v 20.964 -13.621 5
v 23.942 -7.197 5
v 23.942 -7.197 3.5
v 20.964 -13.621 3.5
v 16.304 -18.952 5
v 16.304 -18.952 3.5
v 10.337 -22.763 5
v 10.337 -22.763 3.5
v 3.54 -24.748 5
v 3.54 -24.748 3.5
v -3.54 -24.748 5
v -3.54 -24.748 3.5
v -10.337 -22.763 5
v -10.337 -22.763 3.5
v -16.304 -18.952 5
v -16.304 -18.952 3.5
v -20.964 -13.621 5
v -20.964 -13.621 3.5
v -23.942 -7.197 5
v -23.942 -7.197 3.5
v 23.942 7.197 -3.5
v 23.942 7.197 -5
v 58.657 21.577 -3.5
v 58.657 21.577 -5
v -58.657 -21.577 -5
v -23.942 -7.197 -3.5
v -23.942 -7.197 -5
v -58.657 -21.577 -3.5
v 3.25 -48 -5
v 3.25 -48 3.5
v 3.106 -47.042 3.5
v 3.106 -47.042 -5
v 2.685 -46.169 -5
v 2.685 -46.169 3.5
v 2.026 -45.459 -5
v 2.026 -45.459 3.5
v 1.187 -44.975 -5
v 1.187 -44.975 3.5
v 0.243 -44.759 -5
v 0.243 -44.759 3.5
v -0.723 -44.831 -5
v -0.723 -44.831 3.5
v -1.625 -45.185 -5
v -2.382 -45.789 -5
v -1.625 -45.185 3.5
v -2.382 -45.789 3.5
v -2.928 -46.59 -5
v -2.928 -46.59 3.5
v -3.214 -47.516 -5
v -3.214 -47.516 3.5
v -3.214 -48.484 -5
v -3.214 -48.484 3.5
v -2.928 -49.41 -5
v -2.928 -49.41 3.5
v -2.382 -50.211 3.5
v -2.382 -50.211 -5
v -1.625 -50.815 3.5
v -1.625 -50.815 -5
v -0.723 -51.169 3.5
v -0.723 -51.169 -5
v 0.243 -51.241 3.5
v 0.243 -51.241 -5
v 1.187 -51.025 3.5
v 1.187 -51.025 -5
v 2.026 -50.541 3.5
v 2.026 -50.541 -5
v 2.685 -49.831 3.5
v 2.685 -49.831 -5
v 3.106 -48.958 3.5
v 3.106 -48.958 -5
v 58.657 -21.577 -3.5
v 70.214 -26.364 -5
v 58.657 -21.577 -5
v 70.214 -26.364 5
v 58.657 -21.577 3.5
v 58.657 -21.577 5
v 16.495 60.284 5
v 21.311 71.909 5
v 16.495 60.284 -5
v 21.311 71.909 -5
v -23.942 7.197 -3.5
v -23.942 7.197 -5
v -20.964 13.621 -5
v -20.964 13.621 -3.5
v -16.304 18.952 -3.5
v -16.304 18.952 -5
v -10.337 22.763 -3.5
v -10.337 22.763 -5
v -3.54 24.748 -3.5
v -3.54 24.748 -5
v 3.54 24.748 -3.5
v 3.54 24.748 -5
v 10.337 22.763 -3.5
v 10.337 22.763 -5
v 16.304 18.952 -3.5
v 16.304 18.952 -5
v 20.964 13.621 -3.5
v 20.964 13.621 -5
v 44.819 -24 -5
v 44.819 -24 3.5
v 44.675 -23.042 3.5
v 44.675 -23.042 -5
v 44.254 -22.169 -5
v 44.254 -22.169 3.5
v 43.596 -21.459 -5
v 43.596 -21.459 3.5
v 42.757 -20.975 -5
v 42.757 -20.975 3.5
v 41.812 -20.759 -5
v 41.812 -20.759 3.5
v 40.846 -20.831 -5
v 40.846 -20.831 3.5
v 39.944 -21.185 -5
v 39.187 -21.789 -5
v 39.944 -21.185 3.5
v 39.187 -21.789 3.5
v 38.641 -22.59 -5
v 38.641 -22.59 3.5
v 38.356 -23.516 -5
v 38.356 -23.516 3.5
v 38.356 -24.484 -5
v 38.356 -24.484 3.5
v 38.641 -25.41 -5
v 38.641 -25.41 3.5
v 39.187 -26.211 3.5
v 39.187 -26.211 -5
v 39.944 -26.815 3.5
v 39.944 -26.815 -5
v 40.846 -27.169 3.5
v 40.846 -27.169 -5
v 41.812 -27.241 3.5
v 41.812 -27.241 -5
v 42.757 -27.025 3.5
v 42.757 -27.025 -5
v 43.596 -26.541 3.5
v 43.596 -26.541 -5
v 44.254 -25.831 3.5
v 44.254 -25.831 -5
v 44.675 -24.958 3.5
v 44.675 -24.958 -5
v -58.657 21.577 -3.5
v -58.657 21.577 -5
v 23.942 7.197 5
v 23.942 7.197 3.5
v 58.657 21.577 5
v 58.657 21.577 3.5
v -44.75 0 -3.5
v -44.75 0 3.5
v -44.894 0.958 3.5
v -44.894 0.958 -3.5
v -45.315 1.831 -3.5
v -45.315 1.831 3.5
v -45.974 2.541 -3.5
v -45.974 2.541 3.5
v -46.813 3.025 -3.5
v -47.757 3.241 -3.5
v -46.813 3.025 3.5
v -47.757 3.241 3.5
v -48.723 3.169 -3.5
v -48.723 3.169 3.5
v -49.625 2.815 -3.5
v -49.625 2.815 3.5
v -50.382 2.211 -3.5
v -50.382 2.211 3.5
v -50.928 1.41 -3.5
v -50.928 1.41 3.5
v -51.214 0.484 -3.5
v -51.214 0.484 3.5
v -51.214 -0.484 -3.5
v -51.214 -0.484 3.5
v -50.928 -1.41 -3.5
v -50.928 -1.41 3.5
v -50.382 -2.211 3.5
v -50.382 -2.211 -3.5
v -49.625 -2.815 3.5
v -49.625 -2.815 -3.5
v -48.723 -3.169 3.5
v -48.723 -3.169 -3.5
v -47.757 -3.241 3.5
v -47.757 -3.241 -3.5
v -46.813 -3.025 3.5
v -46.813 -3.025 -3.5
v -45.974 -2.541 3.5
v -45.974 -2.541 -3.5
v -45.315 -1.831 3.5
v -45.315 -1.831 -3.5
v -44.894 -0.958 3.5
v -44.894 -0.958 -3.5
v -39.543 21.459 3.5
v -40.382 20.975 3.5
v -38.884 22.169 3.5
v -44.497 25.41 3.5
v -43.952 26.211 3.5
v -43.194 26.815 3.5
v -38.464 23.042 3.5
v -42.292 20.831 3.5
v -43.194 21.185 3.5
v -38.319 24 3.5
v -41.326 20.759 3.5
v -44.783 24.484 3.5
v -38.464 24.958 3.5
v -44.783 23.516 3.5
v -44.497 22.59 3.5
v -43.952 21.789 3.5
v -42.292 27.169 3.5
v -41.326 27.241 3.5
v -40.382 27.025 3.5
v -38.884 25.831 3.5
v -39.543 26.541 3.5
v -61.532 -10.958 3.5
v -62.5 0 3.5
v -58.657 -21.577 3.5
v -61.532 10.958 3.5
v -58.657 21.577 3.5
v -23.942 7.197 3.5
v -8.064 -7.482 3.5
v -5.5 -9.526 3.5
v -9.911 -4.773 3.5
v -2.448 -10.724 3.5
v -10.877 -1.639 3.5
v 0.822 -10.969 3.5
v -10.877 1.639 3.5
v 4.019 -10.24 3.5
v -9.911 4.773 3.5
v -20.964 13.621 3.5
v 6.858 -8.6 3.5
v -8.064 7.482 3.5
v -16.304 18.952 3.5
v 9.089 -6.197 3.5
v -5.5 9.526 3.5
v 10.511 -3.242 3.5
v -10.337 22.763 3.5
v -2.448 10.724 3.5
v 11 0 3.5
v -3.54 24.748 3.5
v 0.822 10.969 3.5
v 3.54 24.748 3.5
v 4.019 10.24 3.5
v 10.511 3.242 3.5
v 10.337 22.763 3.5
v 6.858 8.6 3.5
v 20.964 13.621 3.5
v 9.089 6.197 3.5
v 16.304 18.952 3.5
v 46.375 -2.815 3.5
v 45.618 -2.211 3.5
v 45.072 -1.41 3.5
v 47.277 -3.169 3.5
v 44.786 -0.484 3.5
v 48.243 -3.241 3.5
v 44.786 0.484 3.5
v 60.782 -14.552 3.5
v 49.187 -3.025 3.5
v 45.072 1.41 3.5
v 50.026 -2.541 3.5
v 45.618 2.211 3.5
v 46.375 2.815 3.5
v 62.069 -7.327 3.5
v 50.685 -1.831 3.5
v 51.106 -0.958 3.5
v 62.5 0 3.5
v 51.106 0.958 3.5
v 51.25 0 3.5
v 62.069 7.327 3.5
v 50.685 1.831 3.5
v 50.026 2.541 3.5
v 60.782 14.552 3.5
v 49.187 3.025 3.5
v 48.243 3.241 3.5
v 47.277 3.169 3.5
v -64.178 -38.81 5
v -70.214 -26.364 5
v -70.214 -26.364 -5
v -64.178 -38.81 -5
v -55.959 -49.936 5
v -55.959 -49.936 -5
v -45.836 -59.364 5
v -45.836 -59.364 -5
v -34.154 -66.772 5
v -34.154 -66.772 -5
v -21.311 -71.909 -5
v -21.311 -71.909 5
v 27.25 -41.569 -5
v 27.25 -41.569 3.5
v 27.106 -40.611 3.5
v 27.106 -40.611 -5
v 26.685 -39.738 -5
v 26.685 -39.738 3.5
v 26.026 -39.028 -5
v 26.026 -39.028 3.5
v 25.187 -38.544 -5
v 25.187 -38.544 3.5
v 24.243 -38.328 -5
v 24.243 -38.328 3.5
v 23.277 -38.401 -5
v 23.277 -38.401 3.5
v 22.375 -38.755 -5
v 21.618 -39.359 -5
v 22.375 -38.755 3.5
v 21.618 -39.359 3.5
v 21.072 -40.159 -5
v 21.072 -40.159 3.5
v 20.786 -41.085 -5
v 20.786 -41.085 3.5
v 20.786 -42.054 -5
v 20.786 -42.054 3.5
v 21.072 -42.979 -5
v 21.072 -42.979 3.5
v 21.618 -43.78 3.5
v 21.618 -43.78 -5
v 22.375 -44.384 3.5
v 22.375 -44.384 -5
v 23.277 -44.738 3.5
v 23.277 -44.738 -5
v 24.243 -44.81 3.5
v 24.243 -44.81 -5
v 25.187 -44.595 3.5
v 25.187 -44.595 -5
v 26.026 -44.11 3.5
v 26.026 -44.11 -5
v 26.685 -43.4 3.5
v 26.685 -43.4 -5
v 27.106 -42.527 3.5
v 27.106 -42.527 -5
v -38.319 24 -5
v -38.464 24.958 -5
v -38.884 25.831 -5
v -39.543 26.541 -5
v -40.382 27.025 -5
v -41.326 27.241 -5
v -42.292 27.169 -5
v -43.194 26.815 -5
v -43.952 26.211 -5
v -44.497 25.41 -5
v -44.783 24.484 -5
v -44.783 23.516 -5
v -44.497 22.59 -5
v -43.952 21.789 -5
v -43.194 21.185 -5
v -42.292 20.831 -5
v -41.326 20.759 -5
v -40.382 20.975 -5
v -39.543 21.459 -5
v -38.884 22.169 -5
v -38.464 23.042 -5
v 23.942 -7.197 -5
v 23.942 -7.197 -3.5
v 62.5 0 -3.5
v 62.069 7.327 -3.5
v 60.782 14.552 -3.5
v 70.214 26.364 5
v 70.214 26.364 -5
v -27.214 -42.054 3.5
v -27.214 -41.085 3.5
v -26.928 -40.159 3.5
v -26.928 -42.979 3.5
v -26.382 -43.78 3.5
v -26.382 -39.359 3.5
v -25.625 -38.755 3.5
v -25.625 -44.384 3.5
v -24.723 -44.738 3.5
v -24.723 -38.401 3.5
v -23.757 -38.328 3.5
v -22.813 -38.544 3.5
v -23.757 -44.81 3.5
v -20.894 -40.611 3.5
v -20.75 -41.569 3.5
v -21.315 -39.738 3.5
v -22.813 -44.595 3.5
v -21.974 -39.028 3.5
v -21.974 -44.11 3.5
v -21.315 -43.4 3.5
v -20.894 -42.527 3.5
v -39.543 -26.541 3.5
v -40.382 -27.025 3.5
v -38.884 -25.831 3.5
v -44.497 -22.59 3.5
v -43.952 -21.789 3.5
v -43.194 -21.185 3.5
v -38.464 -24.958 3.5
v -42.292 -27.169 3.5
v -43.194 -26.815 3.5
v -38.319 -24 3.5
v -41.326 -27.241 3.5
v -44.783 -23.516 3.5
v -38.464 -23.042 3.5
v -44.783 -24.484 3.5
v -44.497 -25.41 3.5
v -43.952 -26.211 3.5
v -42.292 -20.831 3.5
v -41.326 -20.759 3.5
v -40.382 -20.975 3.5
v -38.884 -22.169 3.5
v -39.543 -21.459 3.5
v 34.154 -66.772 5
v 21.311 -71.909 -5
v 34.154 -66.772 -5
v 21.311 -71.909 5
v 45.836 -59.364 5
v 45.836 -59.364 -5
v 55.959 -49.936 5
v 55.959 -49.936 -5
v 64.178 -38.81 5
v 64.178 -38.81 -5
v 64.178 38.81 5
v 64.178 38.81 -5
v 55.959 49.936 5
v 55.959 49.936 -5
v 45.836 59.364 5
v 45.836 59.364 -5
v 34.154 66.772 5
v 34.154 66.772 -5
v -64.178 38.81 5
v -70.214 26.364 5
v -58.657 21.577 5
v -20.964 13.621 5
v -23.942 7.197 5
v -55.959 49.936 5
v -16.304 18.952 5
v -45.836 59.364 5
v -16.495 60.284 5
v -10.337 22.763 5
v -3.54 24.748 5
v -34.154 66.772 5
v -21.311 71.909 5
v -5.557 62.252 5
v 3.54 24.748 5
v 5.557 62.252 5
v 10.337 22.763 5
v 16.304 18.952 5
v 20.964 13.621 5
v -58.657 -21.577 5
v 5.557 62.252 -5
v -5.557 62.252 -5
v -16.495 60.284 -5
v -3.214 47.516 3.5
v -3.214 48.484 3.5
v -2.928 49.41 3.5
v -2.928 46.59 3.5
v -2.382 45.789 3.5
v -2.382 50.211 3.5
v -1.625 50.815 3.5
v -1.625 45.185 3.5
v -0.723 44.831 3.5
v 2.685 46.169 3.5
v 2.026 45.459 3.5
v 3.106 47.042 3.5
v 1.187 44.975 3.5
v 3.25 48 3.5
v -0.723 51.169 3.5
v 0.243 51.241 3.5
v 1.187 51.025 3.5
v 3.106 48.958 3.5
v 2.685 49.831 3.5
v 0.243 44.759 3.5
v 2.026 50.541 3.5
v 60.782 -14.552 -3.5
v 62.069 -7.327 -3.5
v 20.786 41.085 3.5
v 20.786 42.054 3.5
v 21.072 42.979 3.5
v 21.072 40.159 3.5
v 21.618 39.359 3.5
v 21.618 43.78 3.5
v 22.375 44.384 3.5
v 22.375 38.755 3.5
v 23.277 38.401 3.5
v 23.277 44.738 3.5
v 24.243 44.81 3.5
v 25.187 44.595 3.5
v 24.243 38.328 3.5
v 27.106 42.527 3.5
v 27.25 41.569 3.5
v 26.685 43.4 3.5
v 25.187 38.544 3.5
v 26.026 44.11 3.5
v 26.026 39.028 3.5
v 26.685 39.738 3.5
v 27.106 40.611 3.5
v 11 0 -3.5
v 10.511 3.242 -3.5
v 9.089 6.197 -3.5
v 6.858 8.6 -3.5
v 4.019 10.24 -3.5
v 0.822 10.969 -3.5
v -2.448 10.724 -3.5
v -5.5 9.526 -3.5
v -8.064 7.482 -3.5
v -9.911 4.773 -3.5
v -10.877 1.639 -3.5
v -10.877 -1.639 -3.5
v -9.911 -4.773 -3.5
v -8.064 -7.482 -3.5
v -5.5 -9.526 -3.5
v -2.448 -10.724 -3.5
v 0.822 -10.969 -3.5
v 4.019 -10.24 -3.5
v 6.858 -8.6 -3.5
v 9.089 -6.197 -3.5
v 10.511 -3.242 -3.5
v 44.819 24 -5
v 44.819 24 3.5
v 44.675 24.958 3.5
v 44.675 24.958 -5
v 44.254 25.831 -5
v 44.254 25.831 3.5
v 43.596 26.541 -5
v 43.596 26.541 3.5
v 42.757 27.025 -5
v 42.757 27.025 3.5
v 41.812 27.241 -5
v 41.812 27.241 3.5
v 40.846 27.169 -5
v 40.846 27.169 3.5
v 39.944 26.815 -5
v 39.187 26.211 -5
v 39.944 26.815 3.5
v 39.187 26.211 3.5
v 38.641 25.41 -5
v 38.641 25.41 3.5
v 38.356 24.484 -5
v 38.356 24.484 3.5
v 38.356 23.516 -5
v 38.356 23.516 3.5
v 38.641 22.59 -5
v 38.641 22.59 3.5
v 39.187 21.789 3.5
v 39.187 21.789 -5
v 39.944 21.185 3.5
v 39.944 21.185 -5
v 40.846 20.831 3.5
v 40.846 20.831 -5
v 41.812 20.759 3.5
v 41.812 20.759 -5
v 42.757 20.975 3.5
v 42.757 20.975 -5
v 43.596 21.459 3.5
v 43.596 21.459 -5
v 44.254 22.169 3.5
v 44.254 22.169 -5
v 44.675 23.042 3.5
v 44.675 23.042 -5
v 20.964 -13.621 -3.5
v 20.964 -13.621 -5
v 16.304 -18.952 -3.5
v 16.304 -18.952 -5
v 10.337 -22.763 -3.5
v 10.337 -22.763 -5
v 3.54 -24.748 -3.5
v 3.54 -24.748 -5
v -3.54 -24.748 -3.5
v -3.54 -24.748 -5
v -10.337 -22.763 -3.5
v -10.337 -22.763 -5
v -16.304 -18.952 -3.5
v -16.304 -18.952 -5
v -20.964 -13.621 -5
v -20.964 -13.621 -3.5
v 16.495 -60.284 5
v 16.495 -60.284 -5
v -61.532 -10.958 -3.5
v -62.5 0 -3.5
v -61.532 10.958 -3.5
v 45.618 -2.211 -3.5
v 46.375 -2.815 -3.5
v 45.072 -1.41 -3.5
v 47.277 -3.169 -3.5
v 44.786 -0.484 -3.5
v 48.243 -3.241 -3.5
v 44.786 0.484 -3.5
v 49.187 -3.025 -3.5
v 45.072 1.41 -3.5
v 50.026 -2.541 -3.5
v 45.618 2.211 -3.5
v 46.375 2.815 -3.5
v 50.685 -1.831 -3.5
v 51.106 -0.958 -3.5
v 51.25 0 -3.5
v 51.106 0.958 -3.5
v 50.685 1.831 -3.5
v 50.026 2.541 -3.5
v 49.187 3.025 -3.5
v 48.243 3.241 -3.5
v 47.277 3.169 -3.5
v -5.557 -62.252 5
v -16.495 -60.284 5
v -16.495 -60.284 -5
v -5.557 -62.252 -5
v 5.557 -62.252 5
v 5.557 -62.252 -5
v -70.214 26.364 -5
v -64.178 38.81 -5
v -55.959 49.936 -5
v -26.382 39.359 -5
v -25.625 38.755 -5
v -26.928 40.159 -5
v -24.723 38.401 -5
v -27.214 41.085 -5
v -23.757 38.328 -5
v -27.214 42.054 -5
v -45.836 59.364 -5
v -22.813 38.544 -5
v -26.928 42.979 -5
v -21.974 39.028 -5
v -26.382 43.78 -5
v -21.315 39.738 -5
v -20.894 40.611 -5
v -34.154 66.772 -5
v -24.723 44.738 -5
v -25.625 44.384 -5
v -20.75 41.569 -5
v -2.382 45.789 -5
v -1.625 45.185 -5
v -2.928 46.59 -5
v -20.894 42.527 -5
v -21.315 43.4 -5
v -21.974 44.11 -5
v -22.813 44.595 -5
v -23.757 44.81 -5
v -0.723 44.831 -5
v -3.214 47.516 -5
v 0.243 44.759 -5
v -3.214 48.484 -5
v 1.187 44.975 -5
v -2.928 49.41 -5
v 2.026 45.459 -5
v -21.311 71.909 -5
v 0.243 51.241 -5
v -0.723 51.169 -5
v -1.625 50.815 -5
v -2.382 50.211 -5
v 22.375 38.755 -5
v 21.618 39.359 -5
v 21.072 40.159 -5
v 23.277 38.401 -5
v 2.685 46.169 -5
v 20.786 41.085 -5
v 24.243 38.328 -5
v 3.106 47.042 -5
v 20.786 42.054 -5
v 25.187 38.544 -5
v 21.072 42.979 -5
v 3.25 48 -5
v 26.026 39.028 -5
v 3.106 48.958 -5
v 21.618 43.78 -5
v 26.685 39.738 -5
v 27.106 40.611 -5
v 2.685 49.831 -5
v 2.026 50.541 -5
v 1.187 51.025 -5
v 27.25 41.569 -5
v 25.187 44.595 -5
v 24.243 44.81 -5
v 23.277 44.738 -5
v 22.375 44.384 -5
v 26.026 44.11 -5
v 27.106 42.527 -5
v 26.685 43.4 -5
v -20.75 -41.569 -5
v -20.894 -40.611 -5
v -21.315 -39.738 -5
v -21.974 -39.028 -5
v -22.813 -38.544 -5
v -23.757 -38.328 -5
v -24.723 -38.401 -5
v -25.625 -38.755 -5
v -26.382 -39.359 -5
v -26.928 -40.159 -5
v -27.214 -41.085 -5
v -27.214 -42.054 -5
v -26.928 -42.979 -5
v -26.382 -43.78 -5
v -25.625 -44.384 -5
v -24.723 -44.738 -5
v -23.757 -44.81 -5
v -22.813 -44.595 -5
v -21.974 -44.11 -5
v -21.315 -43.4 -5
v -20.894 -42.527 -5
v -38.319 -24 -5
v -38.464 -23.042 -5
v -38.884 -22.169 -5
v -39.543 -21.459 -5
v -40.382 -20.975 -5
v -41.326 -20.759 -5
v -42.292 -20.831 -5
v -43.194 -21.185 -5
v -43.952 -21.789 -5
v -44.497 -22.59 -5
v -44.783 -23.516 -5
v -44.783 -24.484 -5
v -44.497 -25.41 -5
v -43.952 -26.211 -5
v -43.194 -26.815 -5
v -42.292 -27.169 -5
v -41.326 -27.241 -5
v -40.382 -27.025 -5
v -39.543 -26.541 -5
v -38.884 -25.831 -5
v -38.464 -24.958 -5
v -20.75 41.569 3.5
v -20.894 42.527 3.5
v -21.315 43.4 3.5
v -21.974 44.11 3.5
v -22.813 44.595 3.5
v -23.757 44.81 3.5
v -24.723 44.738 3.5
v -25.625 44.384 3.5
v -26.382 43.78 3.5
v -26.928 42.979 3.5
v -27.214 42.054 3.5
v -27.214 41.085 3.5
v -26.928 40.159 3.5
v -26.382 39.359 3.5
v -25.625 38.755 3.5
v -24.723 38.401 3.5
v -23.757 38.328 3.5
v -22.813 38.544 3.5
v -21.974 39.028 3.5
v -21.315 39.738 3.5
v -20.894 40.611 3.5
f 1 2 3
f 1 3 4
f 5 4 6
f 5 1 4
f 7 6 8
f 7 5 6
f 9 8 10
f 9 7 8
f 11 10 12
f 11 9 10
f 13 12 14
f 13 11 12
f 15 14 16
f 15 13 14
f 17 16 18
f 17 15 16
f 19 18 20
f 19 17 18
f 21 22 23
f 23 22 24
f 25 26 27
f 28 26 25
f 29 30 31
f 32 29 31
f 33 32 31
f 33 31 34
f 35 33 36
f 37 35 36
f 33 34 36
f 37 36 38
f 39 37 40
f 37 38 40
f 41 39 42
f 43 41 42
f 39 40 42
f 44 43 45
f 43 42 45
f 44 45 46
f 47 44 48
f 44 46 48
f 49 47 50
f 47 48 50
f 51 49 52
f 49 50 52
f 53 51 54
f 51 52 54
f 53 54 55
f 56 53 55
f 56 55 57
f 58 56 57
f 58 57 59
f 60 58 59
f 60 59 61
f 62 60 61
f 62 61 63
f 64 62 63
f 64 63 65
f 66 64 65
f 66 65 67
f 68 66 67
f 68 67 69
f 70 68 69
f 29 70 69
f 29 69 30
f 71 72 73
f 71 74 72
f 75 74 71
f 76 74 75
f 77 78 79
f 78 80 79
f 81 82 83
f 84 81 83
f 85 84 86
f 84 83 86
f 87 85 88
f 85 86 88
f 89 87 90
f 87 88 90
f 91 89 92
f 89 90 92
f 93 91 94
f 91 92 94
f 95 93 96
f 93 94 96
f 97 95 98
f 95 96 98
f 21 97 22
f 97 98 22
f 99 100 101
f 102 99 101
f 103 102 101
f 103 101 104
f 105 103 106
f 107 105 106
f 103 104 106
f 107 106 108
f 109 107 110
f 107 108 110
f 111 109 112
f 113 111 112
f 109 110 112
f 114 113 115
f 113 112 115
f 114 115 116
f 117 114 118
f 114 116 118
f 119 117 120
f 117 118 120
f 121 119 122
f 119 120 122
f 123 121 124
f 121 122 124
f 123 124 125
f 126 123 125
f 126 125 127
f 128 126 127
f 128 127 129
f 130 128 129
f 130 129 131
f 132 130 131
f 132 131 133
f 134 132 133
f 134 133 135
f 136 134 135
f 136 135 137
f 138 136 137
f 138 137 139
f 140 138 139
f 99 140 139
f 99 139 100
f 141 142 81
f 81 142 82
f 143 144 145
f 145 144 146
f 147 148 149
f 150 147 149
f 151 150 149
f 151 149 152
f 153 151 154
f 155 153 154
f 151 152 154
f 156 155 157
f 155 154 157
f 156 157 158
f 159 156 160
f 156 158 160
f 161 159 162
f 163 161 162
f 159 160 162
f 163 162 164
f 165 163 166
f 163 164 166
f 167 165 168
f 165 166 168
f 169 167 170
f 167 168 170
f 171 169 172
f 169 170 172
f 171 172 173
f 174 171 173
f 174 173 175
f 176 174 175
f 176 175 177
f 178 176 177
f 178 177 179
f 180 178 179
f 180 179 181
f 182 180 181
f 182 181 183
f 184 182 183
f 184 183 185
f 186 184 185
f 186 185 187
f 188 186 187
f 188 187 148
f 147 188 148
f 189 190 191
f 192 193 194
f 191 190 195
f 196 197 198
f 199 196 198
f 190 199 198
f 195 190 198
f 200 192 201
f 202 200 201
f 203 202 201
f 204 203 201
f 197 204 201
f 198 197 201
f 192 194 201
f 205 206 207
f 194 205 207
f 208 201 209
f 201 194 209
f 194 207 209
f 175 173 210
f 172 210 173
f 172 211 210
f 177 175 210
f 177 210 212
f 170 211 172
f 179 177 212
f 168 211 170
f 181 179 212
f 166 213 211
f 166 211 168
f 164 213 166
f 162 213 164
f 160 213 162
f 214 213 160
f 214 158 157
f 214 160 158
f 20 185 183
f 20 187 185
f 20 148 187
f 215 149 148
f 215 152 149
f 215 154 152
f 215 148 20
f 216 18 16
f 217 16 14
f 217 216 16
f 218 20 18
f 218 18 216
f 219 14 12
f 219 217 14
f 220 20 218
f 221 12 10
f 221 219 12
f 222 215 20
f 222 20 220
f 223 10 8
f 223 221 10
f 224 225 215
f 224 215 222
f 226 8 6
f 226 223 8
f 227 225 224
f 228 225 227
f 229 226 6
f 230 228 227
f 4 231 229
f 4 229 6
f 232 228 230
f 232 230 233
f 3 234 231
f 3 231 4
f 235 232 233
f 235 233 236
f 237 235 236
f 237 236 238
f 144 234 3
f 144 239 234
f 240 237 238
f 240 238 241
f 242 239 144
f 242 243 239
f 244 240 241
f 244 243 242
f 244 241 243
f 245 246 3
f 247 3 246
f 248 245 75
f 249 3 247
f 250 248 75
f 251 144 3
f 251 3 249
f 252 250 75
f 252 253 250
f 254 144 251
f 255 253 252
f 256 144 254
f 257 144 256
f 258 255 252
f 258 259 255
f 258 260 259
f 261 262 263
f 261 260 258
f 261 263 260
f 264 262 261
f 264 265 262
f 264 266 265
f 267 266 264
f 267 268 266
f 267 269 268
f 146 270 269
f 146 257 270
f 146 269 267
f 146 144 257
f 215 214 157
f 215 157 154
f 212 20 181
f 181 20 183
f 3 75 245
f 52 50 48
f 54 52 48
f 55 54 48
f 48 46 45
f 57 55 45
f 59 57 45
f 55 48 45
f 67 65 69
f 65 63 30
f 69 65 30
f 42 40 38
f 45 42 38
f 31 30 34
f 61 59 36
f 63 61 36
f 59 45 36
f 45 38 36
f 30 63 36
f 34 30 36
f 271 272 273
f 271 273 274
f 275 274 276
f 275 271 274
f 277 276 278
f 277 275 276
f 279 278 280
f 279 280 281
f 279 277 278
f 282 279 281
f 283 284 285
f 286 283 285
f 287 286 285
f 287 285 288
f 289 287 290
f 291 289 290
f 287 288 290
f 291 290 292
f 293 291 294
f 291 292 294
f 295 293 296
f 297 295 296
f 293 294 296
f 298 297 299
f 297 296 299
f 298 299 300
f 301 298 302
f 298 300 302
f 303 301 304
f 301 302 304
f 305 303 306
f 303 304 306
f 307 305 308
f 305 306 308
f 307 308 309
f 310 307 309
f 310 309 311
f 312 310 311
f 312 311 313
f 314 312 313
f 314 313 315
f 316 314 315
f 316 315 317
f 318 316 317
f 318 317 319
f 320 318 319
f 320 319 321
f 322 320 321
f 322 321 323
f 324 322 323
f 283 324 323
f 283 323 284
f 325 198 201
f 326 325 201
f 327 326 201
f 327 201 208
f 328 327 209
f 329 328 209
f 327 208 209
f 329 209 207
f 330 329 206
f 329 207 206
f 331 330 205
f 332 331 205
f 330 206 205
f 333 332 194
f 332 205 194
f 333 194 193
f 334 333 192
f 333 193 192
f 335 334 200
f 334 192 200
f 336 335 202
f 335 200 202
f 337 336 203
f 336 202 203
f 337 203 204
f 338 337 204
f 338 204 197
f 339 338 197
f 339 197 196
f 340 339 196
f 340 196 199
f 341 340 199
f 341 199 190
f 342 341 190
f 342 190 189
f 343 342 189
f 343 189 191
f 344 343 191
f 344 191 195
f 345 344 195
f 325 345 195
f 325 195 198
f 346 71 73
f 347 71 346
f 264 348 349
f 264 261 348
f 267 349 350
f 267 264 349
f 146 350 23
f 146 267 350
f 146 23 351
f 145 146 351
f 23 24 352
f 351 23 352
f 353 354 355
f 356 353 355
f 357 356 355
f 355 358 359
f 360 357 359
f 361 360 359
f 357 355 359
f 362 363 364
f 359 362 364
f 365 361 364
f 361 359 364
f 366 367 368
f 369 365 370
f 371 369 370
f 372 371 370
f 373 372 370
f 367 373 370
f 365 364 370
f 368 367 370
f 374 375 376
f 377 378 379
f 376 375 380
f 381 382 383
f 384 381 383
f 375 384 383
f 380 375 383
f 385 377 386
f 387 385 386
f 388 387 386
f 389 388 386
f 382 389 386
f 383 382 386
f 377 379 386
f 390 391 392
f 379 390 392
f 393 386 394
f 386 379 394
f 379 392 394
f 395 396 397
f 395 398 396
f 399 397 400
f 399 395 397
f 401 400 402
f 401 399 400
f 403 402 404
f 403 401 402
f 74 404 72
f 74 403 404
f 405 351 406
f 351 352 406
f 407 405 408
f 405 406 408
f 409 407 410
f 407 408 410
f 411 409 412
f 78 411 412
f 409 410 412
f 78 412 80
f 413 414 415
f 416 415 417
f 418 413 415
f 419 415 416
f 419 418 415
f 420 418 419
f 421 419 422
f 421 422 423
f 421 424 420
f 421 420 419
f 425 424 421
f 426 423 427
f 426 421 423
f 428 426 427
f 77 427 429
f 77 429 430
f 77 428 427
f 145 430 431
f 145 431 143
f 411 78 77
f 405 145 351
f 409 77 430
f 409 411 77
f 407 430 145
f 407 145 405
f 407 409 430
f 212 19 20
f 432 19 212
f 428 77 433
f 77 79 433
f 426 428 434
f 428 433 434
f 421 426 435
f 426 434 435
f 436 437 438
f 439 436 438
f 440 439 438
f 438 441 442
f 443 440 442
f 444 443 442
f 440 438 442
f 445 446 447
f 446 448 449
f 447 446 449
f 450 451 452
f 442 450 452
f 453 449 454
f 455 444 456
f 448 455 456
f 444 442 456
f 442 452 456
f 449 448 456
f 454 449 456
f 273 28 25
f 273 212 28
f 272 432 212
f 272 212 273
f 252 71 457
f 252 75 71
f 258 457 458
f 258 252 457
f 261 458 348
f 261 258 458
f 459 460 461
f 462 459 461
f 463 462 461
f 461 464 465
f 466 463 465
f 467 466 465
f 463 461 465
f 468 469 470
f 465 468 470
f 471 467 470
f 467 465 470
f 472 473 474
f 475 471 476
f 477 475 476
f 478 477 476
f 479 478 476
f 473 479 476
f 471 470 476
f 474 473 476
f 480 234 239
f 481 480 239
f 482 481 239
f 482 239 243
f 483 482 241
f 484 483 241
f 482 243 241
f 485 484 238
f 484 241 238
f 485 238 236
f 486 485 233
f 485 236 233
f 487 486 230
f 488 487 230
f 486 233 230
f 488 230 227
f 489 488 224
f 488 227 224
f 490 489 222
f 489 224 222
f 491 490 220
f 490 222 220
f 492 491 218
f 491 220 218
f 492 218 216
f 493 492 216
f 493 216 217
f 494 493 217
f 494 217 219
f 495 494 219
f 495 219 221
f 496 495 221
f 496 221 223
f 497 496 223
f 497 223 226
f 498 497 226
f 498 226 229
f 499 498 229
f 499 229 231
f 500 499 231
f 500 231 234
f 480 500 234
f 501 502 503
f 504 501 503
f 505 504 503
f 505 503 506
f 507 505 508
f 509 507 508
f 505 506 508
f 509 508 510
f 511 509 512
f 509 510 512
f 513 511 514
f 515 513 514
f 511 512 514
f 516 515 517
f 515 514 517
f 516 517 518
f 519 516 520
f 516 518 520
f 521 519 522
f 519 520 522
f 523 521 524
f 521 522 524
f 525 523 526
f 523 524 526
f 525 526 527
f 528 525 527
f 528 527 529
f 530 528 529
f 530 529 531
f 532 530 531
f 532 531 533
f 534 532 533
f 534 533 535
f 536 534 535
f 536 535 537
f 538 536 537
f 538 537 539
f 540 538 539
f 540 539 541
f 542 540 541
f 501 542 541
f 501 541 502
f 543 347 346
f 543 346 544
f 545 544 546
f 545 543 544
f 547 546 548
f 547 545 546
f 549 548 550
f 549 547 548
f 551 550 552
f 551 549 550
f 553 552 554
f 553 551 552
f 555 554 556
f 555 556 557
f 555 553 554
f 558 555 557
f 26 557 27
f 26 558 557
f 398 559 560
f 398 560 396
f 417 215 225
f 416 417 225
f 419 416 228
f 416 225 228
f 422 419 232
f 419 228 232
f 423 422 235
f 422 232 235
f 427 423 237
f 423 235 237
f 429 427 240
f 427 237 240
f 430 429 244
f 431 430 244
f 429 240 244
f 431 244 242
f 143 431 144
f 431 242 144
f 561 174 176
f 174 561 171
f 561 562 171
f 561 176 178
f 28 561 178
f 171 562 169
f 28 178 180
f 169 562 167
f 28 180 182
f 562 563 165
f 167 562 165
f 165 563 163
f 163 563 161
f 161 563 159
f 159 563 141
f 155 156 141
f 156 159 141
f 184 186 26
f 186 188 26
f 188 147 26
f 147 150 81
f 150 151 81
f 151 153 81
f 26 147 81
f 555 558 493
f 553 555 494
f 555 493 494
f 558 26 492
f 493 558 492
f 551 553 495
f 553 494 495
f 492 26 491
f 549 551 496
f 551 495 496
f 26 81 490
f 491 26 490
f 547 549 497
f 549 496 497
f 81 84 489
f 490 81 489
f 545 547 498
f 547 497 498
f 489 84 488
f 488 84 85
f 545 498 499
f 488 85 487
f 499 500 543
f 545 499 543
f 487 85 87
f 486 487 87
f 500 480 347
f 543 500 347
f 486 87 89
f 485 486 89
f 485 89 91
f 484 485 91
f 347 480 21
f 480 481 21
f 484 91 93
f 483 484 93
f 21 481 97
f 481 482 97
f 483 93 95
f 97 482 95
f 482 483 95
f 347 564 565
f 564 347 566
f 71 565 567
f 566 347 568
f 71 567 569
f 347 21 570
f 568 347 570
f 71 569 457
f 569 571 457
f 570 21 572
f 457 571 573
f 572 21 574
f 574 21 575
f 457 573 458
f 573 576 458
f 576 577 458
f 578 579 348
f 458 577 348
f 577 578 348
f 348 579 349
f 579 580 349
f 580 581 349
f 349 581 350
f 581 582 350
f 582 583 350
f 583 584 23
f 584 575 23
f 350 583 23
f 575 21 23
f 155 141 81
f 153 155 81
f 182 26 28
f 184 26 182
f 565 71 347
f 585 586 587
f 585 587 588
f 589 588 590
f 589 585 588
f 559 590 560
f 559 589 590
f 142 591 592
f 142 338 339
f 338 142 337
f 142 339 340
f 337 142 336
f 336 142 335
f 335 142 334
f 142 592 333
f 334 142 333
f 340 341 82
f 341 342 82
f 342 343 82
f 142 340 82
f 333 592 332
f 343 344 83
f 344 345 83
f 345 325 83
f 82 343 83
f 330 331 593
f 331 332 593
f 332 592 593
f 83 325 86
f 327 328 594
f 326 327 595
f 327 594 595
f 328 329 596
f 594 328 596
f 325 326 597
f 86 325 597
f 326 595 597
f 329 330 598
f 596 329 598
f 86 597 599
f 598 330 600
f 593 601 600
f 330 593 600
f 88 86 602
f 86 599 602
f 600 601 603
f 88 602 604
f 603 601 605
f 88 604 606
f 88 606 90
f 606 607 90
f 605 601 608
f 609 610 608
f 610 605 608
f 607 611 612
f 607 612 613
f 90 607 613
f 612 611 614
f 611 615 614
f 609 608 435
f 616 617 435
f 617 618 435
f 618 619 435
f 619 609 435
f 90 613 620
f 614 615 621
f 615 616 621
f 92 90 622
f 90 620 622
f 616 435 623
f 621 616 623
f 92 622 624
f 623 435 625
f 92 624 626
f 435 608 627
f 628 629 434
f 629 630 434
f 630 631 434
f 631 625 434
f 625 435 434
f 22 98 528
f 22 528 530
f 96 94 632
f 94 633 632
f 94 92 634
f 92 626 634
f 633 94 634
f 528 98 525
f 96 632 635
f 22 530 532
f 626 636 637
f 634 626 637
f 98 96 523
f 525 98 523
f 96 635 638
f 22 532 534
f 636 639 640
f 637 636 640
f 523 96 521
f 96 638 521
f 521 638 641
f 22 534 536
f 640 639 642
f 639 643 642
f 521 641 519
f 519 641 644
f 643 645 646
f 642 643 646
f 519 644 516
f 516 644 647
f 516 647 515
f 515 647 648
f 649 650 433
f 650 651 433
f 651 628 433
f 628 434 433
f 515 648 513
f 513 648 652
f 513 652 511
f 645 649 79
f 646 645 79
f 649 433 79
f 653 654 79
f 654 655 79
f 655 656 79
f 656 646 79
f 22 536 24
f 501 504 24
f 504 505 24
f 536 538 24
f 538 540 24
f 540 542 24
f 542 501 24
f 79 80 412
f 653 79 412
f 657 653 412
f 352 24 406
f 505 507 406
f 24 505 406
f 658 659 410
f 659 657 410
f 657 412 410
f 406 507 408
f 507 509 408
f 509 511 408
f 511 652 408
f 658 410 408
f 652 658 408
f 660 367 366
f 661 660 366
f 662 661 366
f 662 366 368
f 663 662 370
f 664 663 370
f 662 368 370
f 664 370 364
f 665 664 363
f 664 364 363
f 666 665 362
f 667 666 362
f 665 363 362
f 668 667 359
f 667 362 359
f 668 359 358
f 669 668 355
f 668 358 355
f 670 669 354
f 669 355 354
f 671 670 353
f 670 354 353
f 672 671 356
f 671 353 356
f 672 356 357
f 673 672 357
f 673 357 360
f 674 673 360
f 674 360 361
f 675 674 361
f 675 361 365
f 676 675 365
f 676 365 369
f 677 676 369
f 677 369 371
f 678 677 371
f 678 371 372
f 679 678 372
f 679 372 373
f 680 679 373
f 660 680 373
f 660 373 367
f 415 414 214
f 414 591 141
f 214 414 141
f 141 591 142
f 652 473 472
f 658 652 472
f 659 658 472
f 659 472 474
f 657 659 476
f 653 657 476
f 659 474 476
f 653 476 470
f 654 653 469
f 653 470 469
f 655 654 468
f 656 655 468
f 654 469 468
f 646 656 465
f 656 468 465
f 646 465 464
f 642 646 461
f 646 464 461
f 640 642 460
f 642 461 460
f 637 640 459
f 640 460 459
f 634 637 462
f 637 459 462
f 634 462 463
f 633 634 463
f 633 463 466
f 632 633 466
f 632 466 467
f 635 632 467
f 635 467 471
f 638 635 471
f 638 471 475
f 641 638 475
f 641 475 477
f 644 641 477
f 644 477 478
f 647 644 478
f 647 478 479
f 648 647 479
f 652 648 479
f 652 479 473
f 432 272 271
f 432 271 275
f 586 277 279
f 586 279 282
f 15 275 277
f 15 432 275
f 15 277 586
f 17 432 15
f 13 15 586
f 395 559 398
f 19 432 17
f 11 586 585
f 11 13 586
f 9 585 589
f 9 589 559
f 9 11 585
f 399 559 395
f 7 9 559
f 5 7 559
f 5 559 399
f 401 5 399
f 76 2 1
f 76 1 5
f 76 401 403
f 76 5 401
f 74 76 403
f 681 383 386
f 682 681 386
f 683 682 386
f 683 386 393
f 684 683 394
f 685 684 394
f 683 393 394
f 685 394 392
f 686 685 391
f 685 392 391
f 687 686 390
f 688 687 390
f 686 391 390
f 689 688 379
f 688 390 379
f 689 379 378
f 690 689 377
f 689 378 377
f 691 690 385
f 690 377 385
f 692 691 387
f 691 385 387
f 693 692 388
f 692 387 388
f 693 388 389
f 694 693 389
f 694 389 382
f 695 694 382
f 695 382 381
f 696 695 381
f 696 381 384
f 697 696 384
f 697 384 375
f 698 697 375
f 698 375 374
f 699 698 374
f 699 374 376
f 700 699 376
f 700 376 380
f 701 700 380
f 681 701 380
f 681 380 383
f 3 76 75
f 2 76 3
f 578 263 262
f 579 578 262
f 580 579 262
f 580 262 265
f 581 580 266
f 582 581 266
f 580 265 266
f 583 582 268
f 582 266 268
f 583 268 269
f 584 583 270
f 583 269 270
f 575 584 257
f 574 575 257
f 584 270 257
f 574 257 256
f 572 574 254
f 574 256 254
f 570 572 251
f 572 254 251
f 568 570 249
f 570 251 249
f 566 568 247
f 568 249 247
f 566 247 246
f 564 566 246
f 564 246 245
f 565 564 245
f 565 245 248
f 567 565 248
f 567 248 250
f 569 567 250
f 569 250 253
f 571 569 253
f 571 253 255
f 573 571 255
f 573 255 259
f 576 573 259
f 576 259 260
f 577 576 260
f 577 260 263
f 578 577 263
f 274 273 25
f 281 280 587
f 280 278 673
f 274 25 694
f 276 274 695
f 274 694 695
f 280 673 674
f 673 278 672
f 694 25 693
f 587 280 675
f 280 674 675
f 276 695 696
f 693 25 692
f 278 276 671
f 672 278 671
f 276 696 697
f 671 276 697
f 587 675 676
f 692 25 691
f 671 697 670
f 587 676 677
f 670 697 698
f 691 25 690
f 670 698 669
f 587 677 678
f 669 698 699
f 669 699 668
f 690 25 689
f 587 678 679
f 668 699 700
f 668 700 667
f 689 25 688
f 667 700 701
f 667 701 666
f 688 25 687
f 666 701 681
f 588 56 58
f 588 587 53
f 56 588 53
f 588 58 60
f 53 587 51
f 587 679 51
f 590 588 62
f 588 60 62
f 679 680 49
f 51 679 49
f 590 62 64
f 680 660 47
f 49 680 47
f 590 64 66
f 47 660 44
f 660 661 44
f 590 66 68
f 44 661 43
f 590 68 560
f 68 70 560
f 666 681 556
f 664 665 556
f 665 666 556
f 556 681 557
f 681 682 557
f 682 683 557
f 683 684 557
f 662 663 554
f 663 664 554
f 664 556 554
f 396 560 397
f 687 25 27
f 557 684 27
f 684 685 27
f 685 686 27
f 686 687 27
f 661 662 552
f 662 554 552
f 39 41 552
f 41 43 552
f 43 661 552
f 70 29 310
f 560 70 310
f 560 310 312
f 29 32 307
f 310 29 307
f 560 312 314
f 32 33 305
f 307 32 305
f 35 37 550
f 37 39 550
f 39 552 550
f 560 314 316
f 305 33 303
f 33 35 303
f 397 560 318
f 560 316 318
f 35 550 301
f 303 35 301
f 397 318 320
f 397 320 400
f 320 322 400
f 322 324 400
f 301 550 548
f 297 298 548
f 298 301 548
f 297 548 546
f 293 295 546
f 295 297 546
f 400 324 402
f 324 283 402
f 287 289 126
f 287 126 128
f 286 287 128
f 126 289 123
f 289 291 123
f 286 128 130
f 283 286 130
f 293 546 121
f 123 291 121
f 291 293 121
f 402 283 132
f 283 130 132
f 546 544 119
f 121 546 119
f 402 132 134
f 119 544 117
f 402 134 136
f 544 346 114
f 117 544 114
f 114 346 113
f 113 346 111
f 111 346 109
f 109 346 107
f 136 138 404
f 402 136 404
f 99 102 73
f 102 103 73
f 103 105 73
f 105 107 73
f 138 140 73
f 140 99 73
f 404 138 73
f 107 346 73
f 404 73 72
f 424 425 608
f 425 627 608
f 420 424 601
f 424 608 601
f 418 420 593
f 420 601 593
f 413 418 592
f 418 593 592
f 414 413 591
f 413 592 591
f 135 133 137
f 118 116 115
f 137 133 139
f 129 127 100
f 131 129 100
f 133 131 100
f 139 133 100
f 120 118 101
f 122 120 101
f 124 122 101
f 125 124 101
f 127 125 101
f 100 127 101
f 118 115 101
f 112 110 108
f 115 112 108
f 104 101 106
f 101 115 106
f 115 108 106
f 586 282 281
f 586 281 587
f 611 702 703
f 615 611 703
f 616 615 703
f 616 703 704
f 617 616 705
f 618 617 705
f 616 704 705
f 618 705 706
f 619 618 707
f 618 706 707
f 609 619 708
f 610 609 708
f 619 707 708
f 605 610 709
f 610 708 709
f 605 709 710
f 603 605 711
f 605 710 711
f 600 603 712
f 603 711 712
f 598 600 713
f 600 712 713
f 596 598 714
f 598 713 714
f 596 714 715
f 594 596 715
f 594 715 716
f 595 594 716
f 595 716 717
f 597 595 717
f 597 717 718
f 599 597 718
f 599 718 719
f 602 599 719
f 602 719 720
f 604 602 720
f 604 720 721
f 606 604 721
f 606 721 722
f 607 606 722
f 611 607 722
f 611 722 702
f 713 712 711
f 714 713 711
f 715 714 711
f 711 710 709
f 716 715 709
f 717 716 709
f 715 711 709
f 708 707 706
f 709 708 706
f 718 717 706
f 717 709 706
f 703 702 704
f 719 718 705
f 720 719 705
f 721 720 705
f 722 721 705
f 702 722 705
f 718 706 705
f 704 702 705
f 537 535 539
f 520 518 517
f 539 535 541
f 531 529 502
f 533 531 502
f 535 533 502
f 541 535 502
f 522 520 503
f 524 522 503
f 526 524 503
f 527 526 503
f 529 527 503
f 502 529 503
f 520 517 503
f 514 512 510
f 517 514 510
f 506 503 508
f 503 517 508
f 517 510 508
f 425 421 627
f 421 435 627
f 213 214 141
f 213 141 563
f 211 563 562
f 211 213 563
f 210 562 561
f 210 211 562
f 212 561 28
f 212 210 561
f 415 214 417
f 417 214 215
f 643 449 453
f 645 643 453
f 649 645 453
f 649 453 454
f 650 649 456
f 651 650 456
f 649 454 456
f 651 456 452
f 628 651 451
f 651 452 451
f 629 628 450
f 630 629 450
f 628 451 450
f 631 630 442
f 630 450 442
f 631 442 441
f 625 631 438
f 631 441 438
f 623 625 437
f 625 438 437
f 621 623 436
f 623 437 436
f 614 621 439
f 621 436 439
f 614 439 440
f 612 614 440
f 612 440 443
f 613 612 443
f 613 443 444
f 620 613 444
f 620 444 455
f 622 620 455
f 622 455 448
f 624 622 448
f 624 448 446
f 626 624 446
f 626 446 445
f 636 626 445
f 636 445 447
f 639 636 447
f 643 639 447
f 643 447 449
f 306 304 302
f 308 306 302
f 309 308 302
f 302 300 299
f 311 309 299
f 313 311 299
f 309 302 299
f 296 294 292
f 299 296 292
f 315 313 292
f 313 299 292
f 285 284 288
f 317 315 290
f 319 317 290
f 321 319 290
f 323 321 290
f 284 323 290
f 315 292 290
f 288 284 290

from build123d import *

# Parameters (mm, degrees)
BOSS_EXTRUDE4_DEPTH   = 5
BOSS_EXTRUDE4_2_DEPTH = 5
BOSS_EXTRUDE5_DEPTH   = 3.5
SKETCH2_R             = 11
CUT_EXTRUDE3_DEPTH    = 10
SKETCH2_4_R           = 11
SKETCH2_4_R_2         = 3.25
CUT_EXTRUDE4_DEPTH    = 25


with BuildPart() as part:
    # Sketch1 → Boss-Extrude4 (new, symmetric)
    with BuildSketch(Plane.XY):
        with BuildLine():
            ThreePointArc((-23.941610741, 7.197171327), (0, 25), (23.941610741, 7.197171327))
            Line((23.941610741, 7.197171327), (70.213649137, 26.363677189))
            ThreePointArc((70.213649137, 26.363677189), (51.115143098, 54.883896965), (21.3105738, 71.908688239))
            Line((21.3105738, 71.908688239), (16.495435726, 60.283916597))
            ThreePointArc((16.495435726, 60.283916597), (0, 62.5), (-16.495435726, 60.283916597))
            Line((-16.495435726, 60.283916597), (-21.3105738, 71.908688239))
            ThreePointArc((-21.3105738, 71.908688239), (-51.115143098, 54.883896965), (-70.213649137, 26.363677189))
            Line((-70.213649137, 26.363677189), (-23.941610741, 7.197171327))
        make_face()
    extrude(amount=BOSS_EXTRUDE4_DEPTH, both=True)



with BuildPart() as body_2:
    # Sketch1 → Boss-Extrude4 2 (new, symmetric)
    with BuildSketch(Plane.XY):
        with BuildLine():
            ThreePointArc((-16.495435726, -60.283916597), (0, -62.5), (16.495435726, -60.283916597))
            Line((16.495435726, -60.283916597), (21.3105738, -71.908688239))
            ThreePointArc((21.3105738, -71.908688239), (51.115143098, -54.883896965), (70.213649137, -26.363677189))
            Line((70.213649137, -26.363677189), (23.941610741, -7.197171327))
            ThreePointArc((23.941610741, -7.197171327), (0, -25), (-23.941610741, -7.197171327))
            Line((-23.941610741, -7.197171327), (-70.213649137, -26.363677189))
            ThreePointArc((-70.213649137, -26.363677189), (-51.115143098, -54.883896965), (-21.3105738, -71.908688239))
            Line((-21.3105738, -71.908688239), (-16.495435726, -60.283916597))
        make_face()
    extrude(amount=BOSS_EXTRUDE4_2_DEPTH, both=True)


with BuildPart() as part_1:
    add(part.part)

    add(body_2.part)  # Boss-Extrude5 merges body 2
    # Sketch1<3> → Boss-Extrude5 (add, symmetric)
    with BuildSketch(Plane.XY):
        with BuildLine():
            Line((58.657369372, 21.57690938), (23.941610741, 7.197171327))
            ThreePointArc((23.941610741, 7.197171327), (0, 25), (-23.941610741, 7.197171327))
            Line((-23.941610741, 7.197171327), (-58.657369372, 21.57690938))
            ThreePointArc((-58.657369372, 21.57690938), (-62.5, 0), (-58.657369372, -21.57690938))
            Line((-58.657369372, -21.57690938), (-23.941610741, -7.197171327))
            ThreePointArc((-23.941610741, -7.197171327), (0, -25), (23.941610741, -7.197171327))
            Line((23.941610741, -7.197171327), (58.657369372, -21.57690938))
            ThreePointArc((58.657369372, -21.57690938), (61.53184373, -10.958202733), (62.5, 0))
            ThreePointArc((62.5, 0), (61.53184373, 10.958202733), (58.657369372, 21.57690938))
        make_face()
    extrude(amount=BOSS_EXTRUDE5_DEPTH, both=True)

    # Sketch2 → Cut-Extrude3 (cut)
    with BuildSketch(Plane.XY.offset(3.5)):
        Circle(SKETCH2_R)
    extrude(amount=-CUT_EXTRUDE3_DEPTH, mode=Mode.SUBTRACT)

    # Sketch2<4> → Cut-Extrude4 (cut)
    with BuildSketch(Plane.XY.offset(3.5)):
        Circle(SKETCH2_4_R)
        with Locations((48, 0)):
            Circle(SKETCH2_4_R_2)
        with Locations((41.569219382, -24)):
            Circle(SKETCH2_4_R_2)
        with Locations((24, -41.569219382)):
            Circle(SKETCH2_4_R_2)
        with Locations((0, -48)):
            Circle(SKETCH2_4_R_2)
        with Locations((-24, -41.569219382)):
            Circle(SKETCH2_4_R_2)
        with Locations((-41.569219382, -24)):
            Circle(SKETCH2_4_R_2)
        with Locations((-48, 0)):
            Circle(SKETCH2_4_R_2)
        with Locations((-41.569219382, 24)):
            Circle(SKETCH2_4_R_2)
        with Locations((-24, 41.569219382)):
            Circle(SKETCH2_4_R_2)
        with Locations((0, 48)):
            Circle(SKETCH2_4_R_2)
        with Locations((24, 41.569219382)):
            Circle(SKETCH2_4_R_2)
        with Locations((41.569219382, 24)):
            Circle(SKETCH2_4_R_2)
    extrude(amount=-CUT_EXTRUDE4_DEPTH, mode=Mode.SUBTRACT)


solid = part_1.part
